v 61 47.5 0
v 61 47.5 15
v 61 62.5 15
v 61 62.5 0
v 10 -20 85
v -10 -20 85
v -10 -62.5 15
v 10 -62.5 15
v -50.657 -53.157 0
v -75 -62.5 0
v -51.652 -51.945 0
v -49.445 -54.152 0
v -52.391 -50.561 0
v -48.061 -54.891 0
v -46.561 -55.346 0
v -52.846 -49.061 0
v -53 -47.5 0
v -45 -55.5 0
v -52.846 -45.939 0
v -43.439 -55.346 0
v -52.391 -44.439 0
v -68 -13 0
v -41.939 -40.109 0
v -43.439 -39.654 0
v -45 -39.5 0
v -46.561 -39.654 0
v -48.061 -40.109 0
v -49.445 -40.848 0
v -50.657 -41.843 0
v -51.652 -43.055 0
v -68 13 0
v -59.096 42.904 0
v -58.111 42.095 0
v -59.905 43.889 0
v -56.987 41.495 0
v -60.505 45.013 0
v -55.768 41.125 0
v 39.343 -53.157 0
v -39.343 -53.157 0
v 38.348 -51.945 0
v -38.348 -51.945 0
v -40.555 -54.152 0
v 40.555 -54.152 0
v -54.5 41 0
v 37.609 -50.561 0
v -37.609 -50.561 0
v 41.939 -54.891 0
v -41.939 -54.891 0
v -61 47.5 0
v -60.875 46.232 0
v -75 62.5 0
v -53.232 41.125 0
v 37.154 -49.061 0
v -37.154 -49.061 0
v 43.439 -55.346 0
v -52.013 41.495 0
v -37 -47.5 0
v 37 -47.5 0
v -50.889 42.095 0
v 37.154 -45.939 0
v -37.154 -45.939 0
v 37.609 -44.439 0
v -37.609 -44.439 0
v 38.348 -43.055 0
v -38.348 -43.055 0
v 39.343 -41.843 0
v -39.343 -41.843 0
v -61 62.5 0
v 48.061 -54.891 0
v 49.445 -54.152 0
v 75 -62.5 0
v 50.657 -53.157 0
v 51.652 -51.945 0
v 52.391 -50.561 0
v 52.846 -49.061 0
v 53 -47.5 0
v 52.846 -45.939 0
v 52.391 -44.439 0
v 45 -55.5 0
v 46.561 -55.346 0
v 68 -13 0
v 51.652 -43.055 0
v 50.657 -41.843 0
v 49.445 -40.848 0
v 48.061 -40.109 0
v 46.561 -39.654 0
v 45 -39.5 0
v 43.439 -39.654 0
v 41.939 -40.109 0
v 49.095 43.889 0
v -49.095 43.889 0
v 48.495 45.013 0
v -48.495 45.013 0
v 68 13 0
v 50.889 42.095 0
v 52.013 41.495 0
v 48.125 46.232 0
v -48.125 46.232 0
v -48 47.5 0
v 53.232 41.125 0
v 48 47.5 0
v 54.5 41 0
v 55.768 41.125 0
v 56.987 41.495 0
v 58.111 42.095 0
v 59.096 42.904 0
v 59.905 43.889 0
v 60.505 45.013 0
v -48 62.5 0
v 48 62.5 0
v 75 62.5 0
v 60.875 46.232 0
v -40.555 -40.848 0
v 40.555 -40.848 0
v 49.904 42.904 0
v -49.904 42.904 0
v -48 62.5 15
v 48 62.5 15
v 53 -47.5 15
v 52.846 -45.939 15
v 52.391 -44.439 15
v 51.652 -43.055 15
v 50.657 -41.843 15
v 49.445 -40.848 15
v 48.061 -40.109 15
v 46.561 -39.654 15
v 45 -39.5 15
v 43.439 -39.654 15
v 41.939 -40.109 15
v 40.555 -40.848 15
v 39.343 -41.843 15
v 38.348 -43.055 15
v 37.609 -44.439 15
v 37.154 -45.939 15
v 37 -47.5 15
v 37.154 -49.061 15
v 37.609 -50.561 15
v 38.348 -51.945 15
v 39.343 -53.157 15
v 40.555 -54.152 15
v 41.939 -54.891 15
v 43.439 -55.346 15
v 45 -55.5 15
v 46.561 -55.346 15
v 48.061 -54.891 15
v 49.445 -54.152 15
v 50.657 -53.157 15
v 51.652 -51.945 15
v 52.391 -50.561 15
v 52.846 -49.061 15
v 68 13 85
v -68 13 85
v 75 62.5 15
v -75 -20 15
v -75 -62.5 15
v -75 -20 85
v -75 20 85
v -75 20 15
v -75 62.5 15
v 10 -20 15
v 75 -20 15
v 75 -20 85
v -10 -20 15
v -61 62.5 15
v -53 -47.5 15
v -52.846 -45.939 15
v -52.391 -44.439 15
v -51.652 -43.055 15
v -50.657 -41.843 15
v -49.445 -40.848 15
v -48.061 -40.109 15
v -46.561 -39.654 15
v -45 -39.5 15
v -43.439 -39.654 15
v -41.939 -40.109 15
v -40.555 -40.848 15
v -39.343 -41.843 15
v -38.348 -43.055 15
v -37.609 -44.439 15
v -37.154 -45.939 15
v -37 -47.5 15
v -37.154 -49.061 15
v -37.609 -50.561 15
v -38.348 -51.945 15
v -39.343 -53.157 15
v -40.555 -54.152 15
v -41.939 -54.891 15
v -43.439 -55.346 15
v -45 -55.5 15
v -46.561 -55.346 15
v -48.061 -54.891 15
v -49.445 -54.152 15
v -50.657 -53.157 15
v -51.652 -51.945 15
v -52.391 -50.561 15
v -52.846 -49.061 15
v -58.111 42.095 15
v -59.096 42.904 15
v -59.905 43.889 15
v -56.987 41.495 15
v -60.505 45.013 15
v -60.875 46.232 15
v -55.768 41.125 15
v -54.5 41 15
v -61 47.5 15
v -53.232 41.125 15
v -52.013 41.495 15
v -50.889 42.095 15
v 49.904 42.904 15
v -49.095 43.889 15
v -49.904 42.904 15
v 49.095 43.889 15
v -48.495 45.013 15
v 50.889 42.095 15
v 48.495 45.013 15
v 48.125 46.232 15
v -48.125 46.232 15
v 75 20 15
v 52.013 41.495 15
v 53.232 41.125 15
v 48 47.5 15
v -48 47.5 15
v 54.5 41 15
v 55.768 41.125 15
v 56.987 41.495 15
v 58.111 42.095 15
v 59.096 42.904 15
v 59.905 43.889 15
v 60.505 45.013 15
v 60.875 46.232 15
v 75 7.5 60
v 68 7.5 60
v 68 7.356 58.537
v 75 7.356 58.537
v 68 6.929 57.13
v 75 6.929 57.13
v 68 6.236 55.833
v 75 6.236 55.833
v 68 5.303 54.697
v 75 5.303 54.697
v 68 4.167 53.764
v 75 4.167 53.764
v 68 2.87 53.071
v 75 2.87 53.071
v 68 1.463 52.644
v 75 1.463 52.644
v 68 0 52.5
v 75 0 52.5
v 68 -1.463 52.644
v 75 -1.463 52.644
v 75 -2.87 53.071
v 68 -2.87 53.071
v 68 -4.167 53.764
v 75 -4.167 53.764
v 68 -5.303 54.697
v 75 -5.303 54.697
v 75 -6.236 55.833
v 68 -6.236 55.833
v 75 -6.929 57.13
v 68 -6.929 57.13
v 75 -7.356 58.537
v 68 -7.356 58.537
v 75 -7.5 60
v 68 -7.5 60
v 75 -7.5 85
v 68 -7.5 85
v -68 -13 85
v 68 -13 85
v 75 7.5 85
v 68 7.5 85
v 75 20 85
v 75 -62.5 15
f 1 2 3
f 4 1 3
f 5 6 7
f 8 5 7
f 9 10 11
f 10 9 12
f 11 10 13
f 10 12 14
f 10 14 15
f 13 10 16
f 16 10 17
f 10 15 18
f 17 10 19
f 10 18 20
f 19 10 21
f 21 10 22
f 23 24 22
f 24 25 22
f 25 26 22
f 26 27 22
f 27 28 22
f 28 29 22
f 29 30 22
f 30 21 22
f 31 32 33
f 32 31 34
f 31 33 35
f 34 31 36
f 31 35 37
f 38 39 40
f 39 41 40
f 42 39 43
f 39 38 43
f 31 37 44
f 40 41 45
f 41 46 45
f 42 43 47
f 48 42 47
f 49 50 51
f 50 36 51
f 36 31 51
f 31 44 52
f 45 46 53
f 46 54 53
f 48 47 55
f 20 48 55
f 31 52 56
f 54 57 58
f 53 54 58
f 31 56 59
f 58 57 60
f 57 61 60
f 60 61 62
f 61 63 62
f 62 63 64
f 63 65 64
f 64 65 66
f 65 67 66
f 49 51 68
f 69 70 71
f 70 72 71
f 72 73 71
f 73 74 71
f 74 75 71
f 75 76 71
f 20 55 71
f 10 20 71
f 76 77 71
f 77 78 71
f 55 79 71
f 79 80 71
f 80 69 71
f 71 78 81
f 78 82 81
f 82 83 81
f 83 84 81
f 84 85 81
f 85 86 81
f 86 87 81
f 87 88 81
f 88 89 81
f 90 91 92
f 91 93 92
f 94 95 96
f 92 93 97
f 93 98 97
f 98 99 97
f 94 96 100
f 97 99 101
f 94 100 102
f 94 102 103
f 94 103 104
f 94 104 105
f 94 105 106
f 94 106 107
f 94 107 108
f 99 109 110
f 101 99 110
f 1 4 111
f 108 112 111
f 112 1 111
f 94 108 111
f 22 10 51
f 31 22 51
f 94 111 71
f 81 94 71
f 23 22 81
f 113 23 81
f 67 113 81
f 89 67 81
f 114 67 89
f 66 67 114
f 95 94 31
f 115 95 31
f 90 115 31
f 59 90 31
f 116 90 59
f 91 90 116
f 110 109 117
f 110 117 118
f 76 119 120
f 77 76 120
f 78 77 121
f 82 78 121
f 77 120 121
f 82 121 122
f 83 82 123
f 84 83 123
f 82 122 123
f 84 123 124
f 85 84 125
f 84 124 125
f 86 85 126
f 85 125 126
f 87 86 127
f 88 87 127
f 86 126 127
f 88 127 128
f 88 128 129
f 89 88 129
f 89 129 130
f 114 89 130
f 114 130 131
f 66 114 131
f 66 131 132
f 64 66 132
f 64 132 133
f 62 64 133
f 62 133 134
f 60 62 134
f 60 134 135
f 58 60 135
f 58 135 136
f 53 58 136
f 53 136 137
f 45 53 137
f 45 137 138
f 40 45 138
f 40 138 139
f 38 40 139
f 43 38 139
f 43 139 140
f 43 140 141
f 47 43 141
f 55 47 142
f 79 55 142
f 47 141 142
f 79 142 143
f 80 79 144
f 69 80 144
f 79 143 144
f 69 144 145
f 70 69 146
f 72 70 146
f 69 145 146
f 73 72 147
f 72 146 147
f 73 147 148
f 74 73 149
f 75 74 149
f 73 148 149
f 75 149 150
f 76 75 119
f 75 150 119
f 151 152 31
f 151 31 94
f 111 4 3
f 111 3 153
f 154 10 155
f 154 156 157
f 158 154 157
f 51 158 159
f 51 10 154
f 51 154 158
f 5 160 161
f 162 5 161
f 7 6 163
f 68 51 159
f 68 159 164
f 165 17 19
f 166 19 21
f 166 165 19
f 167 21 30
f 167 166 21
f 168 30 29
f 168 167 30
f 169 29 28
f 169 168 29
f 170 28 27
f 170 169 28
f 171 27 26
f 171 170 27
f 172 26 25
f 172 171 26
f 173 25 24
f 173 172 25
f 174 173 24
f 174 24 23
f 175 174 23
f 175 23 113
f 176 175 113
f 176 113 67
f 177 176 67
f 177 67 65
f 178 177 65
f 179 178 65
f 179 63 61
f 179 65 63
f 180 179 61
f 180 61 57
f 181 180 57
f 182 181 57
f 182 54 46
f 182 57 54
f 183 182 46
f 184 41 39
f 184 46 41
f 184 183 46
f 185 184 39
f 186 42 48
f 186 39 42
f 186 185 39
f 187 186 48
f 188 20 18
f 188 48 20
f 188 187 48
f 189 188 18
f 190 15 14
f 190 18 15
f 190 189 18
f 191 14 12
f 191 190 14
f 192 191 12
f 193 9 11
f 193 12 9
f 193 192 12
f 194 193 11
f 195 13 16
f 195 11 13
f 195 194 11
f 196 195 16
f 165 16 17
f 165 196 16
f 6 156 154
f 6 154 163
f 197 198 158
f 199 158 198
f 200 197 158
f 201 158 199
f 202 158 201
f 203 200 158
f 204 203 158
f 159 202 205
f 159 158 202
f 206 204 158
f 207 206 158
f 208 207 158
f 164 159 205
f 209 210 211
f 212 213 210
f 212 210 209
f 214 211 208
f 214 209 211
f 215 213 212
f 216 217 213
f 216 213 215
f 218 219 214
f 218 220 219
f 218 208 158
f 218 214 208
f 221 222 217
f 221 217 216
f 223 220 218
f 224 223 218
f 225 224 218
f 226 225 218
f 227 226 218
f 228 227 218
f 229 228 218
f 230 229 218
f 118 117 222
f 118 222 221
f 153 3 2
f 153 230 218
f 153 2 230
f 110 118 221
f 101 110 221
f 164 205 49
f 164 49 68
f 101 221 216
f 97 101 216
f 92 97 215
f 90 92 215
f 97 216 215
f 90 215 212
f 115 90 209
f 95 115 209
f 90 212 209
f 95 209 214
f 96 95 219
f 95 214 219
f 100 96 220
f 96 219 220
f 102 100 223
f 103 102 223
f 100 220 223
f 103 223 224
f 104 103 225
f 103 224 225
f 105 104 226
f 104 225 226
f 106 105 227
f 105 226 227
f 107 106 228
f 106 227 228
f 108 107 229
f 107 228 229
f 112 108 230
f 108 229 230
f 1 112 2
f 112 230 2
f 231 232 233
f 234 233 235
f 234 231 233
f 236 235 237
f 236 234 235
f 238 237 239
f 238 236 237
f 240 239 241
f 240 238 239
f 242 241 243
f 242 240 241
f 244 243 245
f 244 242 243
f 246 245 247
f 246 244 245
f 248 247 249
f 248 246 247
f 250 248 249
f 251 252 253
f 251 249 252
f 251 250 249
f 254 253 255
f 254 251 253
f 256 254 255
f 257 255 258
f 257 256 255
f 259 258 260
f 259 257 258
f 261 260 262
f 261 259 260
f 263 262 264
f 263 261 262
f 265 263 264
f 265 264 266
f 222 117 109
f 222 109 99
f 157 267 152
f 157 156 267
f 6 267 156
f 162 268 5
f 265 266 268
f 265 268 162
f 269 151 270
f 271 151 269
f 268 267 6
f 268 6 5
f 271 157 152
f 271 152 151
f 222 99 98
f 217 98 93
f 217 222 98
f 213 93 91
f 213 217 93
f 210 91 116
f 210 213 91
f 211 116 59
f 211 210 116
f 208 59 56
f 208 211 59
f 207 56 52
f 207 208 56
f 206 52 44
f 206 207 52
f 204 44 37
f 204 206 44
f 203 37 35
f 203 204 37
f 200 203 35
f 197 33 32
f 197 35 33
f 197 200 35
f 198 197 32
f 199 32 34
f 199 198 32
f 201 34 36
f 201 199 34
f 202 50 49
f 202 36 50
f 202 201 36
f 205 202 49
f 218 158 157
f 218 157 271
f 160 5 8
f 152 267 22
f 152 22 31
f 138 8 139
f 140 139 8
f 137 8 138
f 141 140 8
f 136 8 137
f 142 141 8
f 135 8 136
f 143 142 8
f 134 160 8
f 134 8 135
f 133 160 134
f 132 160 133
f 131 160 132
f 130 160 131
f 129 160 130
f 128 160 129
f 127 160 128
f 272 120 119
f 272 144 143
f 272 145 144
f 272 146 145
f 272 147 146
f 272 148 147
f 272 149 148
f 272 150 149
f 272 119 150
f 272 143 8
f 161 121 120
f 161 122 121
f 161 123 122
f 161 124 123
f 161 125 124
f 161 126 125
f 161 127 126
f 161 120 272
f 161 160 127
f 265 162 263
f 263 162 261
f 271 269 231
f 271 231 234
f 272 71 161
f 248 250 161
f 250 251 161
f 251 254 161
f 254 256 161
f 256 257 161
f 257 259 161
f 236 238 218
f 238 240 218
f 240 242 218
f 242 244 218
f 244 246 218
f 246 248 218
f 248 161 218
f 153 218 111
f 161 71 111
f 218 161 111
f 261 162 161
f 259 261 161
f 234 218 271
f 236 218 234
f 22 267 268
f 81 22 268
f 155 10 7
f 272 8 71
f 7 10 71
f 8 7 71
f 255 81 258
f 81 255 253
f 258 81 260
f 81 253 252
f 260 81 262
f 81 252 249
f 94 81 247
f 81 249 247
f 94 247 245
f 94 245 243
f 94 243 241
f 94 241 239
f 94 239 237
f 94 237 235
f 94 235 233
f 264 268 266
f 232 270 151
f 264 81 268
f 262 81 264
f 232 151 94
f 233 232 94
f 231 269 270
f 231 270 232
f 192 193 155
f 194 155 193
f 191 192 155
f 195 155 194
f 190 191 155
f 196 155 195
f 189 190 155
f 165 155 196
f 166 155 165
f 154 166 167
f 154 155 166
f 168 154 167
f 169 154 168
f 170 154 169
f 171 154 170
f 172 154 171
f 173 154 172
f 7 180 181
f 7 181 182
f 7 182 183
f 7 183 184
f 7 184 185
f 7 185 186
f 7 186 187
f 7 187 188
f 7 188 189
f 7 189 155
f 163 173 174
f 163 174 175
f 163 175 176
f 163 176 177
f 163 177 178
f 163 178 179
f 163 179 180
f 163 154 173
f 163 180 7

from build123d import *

# Parameters (mm, degrees)
SKETCH_1_W          = 150
SKETCH_1_H          = 125
EXTRUDE_1_DEPTH     = 15
SKETCH_2_W          = 150
SKETCH_2_H          = 40
EXTRUDE_2_DEPTH     = 70
SKETCH_3_W          = 136
SKETCH_3_H          = 26
CUT_EXTRUDE_1_DEPTH = 130.44593466
SKETCH_4_R          = 8
CUT_EXTRUDE_2_DEPTH = 121.130137767
RIB_1_REACH         = 131.446
SKETCH_5_WALL_W     = 342.78356609
SKETCH_5_WALL_H     = 20
CUT_EXTRUDE1_REACH  = 185.388


with BuildPart() as part:
    # Эскиз1 → Бобышка-Вытянуть1 (new body)
    with BuildSketch(Plane.XY):
        Rectangle(SKETCH_1_W, SKETCH_1_H)
    extrude(amount=EXTRUDE_1_DEPTH)

    # Эскиз2 → Бобышка-Вытянуть2 (add)
    with BuildSketch(Plane.XY.offset(15)):
        Rectangle(SKETCH_2_W, SKETCH_2_H)
    extrude(amount=EXTRUDE_2_DEPTH)

    # Эскиз3 → Вырез-Вытянуть1 (cut, through all)
    with BuildSketch(Plane.XY.offset(85)):
        Rectangle(SKETCH_3_W, SKETCH_3_H)
    extrude(amount=-CUT_EXTRUDE_1_DEPTH, mode=Mode.SUBTRACT)

    # Эскиз4 → Вырез-Вытянуть2 (cut, through all)
    with BuildSketch(Plane.XY.offset(15)):
        with BuildLine():
            Line((48, 62.5), (48, 47.5))
            ThreePointArc((48, 47.5), (54.5, 41), (61, 47.5))
            Line((61, 47.5), (61, 62.5))
            Line((61, 62.5), (48, 62.5))
        make_face()
        with Locations((45, -47.5)):
            Circle(SKETCH_4_R)
    cut_extrude_2 = extrude(amount=-CUT_EXTRUDE_2_DEPTH, mode=Mode.SUBTRACT)

    # Эскиз5 wall → Ребро1 (add, up to next)
    with BuildSketch(Plane(origin=(0, -41.25, 50), x_dir=(0, -0.518978134242, -0.854787515222), z_dir=(0, 0.854787515222, -0.518978134242)), mode=Mode.PRIVATE) as rib_1_sk1:
        Rectangle(SKETCH_5_WALL_W, SKETCH_5_WALL_H)
    rib_1_tool1 = extrude(rib_1_sk1.sketch, amount=RIB_1_REACH, mode=Mode.PRIVATE) - part.part
    add(rib_1_tool1.solids().sort_by_distance((0, -41.25, 50))[0])

    # Зеркальное отражение1: Вырез-Вытянуть2 across plane
    add(cut_extrude_2.mirror(Plane(origin=(0, 0, 0), x_dir=(0, 0, 1), z_dir=(1, 0, 0))), mode=Mode.SUBTRACT)

    # Sketch1 → Cut-Extrude1 (cut, up to next)
    with BuildSketch(Plane(origin=(75, 0, 0), x_dir=(0, 0, -1), z_dir=(1, 0, 0)), mode=Mode.PRIVATE) as cut_extrude1_sk1:
        with BuildLine():
            Line((-85, 7.5), (-60, 7.5))
            ThreePointArc((-60, 7.5), (-52.5, 0), (-60, -7.5))
            Line((-60, -7.5), (-85, -7.5))
            ThreePointArc((-85, -7.5), (-92.5, 0), (-85, 7.5))
        make_face()
    cut_extrude1_tool1 = extrude(cut_extrude1_sk1.sketch, amount=-CUT_EXTRUDE1_REACH, mode=Mode.PRIVATE) & part.part
    add(cut_extrude1_tool1.solids().sort_by_distance((75, 0, 72.5))[0], mode=Mode.SUBTRACT)


solid = part.part
